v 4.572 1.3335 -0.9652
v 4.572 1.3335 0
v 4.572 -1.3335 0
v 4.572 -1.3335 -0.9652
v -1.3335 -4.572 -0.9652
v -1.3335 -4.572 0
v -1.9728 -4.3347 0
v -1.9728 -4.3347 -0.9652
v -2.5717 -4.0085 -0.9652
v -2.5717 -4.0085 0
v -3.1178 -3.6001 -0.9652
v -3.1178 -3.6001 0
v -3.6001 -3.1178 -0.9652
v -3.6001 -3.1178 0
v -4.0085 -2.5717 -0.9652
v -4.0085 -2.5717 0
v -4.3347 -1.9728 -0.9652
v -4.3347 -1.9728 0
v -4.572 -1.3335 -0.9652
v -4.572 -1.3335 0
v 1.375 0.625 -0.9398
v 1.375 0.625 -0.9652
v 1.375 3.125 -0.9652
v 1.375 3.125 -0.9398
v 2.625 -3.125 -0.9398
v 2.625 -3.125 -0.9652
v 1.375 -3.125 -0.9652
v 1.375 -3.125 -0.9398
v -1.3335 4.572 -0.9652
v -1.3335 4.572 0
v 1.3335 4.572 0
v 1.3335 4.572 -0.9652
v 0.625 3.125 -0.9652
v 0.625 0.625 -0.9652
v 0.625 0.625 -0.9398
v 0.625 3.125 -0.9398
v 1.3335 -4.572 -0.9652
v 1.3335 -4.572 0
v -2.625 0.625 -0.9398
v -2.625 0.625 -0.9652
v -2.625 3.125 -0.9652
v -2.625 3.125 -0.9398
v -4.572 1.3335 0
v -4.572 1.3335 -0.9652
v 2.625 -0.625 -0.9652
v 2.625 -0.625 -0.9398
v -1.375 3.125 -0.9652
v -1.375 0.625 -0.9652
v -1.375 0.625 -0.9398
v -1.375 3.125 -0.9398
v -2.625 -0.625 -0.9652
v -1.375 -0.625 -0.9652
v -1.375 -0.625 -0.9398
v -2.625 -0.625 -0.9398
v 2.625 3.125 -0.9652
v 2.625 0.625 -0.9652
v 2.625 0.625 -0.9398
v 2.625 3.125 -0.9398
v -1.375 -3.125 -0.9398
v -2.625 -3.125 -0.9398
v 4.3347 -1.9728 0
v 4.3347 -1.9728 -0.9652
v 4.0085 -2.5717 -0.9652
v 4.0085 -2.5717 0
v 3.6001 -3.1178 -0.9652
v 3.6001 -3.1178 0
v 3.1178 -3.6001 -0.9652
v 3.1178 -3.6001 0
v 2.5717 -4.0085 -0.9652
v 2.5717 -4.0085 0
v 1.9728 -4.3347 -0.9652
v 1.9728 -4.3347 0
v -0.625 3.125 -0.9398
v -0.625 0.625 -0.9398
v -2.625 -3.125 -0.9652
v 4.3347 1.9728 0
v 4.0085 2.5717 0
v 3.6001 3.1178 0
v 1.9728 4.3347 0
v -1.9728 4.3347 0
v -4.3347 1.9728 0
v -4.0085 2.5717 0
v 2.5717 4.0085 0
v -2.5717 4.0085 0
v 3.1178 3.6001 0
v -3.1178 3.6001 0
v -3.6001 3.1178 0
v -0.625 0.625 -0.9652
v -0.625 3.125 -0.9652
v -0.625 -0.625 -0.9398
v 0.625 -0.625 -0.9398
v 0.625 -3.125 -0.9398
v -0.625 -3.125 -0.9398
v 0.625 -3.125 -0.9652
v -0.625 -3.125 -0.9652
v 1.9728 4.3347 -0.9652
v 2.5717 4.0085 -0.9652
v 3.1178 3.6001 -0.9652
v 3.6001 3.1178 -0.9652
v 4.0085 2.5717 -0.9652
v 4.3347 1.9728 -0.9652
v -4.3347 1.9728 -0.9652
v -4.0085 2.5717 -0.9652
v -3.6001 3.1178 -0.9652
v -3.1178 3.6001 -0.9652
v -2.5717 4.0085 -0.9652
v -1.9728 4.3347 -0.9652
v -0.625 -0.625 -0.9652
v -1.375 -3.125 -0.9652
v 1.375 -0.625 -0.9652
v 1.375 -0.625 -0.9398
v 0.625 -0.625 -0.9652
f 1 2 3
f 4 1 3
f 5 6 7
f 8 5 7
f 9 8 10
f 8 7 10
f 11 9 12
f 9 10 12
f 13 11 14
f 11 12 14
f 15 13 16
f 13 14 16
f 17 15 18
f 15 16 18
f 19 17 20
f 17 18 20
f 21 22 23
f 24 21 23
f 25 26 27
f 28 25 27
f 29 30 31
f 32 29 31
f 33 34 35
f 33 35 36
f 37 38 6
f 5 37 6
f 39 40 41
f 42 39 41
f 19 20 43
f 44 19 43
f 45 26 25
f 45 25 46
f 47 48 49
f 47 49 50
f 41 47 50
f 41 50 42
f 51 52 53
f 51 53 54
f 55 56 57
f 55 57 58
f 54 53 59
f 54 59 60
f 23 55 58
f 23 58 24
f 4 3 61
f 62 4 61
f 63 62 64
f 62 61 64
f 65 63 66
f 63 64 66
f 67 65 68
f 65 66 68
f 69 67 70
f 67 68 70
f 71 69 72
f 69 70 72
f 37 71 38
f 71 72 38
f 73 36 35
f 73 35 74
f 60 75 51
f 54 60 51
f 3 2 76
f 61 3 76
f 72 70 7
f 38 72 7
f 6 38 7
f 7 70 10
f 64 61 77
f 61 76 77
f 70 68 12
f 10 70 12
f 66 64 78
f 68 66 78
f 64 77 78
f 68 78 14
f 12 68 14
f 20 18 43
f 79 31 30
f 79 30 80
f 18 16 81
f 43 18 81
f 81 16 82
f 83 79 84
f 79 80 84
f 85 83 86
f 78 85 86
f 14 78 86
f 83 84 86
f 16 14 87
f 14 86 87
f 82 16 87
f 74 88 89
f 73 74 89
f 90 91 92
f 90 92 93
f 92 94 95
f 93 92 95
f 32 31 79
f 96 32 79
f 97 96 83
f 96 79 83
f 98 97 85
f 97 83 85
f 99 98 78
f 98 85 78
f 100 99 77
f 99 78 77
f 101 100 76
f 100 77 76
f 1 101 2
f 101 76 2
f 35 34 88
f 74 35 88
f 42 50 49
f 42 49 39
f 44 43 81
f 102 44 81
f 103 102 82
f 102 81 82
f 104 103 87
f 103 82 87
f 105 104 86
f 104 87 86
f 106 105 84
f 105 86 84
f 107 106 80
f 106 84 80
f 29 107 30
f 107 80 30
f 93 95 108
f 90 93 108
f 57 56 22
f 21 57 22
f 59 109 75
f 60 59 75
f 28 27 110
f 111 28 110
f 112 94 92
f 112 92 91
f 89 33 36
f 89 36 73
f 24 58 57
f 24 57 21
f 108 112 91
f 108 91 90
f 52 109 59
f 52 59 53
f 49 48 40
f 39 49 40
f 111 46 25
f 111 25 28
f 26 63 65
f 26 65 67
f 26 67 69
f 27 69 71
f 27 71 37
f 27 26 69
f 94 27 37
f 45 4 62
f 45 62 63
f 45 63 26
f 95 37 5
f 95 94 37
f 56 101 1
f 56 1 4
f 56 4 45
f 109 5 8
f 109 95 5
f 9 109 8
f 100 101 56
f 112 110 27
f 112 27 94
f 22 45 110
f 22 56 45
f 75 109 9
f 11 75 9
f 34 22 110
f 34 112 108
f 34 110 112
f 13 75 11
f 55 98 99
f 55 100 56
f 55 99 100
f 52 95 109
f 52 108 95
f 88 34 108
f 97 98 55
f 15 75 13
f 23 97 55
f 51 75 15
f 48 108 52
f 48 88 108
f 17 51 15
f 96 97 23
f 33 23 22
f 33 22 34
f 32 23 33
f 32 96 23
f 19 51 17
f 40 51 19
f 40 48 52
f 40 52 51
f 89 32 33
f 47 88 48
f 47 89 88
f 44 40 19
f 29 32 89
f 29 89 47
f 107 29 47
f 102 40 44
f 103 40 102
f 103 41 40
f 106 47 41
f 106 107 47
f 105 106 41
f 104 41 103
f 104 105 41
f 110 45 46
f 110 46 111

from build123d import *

# Parameters (mm, degrees)
BOSS_EXTRUDE1_DEPTH = 0.9652
SKETCH2_W           = 1.25
SKETCH2_H           = 2.5
CUT_EXTRUDE1_DEPTH  = 0.0254


with BuildPart() as part:
    # Sketch1 → Boss-Extrude1 (new body)
    with BuildSketch(Plane.XY):
        with BuildLine():
            Line((-1.3335, 4.572), (1.3335, 4.572))
            ThreePointArc((1.3335, 4.572), (3.367596045, 3.367596045), (4.572, 1.3335))
            Line((4.572, 1.3335), (4.572, -1.3335))
            ThreePointArc((4.572, -1.3335), (3.367596045, -3.367596045), (1.3335, -4.572))
            Line((1.3335, -4.572), (-1.3335, -4.572))
            ThreePointArc((-1.3335, -4.572), (-3.367596045, -3.367596045), (-4.572, -1.3335))
            Line((-4.572, -1.3335), (-4.572, 1.3335))
            ThreePointArc((-4.572, 1.3335), (-3.367596045, 3.367596045), (-1.3335, 4.572))
        make_face()
    extrude(amount=-BOSS_EXTRUDE1_DEPTH)

    # Sketch2 → Cut-Extrude1 (cut)
    with BuildSketch(Plane(origin=(0, 0, -0.9652), x_dir=(-1, 0, 0), z_dir=(0, 0, -1))):
        with Locations((-2, 1.875)):
            Rectangle(SKETCH2_W, SKETCH2_H)
        with Locations((0, 1.875)):
            Rectangle(SKETCH2_W, SKETCH2_H)
        with Locations((2, 1.875)):
            Rectangle(SKETCH2_W, SKETCH2_H)
        with Locations((-2, -1.875)):
            Rectangle(SKETCH2_W, SKETCH2_H)
        with Locations((0, -1.875)):
            Rectangle(SKETCH2_W, SKETCH2_H)
        with Locations((2, -1.875)):
            Rectangle(SKETCH2_W, SKETCH2_H)
    extrude(amount=-CUT_EXTRUDE1_DEPTH, mode=Mode.SUBTRACT)


solid = part.part
